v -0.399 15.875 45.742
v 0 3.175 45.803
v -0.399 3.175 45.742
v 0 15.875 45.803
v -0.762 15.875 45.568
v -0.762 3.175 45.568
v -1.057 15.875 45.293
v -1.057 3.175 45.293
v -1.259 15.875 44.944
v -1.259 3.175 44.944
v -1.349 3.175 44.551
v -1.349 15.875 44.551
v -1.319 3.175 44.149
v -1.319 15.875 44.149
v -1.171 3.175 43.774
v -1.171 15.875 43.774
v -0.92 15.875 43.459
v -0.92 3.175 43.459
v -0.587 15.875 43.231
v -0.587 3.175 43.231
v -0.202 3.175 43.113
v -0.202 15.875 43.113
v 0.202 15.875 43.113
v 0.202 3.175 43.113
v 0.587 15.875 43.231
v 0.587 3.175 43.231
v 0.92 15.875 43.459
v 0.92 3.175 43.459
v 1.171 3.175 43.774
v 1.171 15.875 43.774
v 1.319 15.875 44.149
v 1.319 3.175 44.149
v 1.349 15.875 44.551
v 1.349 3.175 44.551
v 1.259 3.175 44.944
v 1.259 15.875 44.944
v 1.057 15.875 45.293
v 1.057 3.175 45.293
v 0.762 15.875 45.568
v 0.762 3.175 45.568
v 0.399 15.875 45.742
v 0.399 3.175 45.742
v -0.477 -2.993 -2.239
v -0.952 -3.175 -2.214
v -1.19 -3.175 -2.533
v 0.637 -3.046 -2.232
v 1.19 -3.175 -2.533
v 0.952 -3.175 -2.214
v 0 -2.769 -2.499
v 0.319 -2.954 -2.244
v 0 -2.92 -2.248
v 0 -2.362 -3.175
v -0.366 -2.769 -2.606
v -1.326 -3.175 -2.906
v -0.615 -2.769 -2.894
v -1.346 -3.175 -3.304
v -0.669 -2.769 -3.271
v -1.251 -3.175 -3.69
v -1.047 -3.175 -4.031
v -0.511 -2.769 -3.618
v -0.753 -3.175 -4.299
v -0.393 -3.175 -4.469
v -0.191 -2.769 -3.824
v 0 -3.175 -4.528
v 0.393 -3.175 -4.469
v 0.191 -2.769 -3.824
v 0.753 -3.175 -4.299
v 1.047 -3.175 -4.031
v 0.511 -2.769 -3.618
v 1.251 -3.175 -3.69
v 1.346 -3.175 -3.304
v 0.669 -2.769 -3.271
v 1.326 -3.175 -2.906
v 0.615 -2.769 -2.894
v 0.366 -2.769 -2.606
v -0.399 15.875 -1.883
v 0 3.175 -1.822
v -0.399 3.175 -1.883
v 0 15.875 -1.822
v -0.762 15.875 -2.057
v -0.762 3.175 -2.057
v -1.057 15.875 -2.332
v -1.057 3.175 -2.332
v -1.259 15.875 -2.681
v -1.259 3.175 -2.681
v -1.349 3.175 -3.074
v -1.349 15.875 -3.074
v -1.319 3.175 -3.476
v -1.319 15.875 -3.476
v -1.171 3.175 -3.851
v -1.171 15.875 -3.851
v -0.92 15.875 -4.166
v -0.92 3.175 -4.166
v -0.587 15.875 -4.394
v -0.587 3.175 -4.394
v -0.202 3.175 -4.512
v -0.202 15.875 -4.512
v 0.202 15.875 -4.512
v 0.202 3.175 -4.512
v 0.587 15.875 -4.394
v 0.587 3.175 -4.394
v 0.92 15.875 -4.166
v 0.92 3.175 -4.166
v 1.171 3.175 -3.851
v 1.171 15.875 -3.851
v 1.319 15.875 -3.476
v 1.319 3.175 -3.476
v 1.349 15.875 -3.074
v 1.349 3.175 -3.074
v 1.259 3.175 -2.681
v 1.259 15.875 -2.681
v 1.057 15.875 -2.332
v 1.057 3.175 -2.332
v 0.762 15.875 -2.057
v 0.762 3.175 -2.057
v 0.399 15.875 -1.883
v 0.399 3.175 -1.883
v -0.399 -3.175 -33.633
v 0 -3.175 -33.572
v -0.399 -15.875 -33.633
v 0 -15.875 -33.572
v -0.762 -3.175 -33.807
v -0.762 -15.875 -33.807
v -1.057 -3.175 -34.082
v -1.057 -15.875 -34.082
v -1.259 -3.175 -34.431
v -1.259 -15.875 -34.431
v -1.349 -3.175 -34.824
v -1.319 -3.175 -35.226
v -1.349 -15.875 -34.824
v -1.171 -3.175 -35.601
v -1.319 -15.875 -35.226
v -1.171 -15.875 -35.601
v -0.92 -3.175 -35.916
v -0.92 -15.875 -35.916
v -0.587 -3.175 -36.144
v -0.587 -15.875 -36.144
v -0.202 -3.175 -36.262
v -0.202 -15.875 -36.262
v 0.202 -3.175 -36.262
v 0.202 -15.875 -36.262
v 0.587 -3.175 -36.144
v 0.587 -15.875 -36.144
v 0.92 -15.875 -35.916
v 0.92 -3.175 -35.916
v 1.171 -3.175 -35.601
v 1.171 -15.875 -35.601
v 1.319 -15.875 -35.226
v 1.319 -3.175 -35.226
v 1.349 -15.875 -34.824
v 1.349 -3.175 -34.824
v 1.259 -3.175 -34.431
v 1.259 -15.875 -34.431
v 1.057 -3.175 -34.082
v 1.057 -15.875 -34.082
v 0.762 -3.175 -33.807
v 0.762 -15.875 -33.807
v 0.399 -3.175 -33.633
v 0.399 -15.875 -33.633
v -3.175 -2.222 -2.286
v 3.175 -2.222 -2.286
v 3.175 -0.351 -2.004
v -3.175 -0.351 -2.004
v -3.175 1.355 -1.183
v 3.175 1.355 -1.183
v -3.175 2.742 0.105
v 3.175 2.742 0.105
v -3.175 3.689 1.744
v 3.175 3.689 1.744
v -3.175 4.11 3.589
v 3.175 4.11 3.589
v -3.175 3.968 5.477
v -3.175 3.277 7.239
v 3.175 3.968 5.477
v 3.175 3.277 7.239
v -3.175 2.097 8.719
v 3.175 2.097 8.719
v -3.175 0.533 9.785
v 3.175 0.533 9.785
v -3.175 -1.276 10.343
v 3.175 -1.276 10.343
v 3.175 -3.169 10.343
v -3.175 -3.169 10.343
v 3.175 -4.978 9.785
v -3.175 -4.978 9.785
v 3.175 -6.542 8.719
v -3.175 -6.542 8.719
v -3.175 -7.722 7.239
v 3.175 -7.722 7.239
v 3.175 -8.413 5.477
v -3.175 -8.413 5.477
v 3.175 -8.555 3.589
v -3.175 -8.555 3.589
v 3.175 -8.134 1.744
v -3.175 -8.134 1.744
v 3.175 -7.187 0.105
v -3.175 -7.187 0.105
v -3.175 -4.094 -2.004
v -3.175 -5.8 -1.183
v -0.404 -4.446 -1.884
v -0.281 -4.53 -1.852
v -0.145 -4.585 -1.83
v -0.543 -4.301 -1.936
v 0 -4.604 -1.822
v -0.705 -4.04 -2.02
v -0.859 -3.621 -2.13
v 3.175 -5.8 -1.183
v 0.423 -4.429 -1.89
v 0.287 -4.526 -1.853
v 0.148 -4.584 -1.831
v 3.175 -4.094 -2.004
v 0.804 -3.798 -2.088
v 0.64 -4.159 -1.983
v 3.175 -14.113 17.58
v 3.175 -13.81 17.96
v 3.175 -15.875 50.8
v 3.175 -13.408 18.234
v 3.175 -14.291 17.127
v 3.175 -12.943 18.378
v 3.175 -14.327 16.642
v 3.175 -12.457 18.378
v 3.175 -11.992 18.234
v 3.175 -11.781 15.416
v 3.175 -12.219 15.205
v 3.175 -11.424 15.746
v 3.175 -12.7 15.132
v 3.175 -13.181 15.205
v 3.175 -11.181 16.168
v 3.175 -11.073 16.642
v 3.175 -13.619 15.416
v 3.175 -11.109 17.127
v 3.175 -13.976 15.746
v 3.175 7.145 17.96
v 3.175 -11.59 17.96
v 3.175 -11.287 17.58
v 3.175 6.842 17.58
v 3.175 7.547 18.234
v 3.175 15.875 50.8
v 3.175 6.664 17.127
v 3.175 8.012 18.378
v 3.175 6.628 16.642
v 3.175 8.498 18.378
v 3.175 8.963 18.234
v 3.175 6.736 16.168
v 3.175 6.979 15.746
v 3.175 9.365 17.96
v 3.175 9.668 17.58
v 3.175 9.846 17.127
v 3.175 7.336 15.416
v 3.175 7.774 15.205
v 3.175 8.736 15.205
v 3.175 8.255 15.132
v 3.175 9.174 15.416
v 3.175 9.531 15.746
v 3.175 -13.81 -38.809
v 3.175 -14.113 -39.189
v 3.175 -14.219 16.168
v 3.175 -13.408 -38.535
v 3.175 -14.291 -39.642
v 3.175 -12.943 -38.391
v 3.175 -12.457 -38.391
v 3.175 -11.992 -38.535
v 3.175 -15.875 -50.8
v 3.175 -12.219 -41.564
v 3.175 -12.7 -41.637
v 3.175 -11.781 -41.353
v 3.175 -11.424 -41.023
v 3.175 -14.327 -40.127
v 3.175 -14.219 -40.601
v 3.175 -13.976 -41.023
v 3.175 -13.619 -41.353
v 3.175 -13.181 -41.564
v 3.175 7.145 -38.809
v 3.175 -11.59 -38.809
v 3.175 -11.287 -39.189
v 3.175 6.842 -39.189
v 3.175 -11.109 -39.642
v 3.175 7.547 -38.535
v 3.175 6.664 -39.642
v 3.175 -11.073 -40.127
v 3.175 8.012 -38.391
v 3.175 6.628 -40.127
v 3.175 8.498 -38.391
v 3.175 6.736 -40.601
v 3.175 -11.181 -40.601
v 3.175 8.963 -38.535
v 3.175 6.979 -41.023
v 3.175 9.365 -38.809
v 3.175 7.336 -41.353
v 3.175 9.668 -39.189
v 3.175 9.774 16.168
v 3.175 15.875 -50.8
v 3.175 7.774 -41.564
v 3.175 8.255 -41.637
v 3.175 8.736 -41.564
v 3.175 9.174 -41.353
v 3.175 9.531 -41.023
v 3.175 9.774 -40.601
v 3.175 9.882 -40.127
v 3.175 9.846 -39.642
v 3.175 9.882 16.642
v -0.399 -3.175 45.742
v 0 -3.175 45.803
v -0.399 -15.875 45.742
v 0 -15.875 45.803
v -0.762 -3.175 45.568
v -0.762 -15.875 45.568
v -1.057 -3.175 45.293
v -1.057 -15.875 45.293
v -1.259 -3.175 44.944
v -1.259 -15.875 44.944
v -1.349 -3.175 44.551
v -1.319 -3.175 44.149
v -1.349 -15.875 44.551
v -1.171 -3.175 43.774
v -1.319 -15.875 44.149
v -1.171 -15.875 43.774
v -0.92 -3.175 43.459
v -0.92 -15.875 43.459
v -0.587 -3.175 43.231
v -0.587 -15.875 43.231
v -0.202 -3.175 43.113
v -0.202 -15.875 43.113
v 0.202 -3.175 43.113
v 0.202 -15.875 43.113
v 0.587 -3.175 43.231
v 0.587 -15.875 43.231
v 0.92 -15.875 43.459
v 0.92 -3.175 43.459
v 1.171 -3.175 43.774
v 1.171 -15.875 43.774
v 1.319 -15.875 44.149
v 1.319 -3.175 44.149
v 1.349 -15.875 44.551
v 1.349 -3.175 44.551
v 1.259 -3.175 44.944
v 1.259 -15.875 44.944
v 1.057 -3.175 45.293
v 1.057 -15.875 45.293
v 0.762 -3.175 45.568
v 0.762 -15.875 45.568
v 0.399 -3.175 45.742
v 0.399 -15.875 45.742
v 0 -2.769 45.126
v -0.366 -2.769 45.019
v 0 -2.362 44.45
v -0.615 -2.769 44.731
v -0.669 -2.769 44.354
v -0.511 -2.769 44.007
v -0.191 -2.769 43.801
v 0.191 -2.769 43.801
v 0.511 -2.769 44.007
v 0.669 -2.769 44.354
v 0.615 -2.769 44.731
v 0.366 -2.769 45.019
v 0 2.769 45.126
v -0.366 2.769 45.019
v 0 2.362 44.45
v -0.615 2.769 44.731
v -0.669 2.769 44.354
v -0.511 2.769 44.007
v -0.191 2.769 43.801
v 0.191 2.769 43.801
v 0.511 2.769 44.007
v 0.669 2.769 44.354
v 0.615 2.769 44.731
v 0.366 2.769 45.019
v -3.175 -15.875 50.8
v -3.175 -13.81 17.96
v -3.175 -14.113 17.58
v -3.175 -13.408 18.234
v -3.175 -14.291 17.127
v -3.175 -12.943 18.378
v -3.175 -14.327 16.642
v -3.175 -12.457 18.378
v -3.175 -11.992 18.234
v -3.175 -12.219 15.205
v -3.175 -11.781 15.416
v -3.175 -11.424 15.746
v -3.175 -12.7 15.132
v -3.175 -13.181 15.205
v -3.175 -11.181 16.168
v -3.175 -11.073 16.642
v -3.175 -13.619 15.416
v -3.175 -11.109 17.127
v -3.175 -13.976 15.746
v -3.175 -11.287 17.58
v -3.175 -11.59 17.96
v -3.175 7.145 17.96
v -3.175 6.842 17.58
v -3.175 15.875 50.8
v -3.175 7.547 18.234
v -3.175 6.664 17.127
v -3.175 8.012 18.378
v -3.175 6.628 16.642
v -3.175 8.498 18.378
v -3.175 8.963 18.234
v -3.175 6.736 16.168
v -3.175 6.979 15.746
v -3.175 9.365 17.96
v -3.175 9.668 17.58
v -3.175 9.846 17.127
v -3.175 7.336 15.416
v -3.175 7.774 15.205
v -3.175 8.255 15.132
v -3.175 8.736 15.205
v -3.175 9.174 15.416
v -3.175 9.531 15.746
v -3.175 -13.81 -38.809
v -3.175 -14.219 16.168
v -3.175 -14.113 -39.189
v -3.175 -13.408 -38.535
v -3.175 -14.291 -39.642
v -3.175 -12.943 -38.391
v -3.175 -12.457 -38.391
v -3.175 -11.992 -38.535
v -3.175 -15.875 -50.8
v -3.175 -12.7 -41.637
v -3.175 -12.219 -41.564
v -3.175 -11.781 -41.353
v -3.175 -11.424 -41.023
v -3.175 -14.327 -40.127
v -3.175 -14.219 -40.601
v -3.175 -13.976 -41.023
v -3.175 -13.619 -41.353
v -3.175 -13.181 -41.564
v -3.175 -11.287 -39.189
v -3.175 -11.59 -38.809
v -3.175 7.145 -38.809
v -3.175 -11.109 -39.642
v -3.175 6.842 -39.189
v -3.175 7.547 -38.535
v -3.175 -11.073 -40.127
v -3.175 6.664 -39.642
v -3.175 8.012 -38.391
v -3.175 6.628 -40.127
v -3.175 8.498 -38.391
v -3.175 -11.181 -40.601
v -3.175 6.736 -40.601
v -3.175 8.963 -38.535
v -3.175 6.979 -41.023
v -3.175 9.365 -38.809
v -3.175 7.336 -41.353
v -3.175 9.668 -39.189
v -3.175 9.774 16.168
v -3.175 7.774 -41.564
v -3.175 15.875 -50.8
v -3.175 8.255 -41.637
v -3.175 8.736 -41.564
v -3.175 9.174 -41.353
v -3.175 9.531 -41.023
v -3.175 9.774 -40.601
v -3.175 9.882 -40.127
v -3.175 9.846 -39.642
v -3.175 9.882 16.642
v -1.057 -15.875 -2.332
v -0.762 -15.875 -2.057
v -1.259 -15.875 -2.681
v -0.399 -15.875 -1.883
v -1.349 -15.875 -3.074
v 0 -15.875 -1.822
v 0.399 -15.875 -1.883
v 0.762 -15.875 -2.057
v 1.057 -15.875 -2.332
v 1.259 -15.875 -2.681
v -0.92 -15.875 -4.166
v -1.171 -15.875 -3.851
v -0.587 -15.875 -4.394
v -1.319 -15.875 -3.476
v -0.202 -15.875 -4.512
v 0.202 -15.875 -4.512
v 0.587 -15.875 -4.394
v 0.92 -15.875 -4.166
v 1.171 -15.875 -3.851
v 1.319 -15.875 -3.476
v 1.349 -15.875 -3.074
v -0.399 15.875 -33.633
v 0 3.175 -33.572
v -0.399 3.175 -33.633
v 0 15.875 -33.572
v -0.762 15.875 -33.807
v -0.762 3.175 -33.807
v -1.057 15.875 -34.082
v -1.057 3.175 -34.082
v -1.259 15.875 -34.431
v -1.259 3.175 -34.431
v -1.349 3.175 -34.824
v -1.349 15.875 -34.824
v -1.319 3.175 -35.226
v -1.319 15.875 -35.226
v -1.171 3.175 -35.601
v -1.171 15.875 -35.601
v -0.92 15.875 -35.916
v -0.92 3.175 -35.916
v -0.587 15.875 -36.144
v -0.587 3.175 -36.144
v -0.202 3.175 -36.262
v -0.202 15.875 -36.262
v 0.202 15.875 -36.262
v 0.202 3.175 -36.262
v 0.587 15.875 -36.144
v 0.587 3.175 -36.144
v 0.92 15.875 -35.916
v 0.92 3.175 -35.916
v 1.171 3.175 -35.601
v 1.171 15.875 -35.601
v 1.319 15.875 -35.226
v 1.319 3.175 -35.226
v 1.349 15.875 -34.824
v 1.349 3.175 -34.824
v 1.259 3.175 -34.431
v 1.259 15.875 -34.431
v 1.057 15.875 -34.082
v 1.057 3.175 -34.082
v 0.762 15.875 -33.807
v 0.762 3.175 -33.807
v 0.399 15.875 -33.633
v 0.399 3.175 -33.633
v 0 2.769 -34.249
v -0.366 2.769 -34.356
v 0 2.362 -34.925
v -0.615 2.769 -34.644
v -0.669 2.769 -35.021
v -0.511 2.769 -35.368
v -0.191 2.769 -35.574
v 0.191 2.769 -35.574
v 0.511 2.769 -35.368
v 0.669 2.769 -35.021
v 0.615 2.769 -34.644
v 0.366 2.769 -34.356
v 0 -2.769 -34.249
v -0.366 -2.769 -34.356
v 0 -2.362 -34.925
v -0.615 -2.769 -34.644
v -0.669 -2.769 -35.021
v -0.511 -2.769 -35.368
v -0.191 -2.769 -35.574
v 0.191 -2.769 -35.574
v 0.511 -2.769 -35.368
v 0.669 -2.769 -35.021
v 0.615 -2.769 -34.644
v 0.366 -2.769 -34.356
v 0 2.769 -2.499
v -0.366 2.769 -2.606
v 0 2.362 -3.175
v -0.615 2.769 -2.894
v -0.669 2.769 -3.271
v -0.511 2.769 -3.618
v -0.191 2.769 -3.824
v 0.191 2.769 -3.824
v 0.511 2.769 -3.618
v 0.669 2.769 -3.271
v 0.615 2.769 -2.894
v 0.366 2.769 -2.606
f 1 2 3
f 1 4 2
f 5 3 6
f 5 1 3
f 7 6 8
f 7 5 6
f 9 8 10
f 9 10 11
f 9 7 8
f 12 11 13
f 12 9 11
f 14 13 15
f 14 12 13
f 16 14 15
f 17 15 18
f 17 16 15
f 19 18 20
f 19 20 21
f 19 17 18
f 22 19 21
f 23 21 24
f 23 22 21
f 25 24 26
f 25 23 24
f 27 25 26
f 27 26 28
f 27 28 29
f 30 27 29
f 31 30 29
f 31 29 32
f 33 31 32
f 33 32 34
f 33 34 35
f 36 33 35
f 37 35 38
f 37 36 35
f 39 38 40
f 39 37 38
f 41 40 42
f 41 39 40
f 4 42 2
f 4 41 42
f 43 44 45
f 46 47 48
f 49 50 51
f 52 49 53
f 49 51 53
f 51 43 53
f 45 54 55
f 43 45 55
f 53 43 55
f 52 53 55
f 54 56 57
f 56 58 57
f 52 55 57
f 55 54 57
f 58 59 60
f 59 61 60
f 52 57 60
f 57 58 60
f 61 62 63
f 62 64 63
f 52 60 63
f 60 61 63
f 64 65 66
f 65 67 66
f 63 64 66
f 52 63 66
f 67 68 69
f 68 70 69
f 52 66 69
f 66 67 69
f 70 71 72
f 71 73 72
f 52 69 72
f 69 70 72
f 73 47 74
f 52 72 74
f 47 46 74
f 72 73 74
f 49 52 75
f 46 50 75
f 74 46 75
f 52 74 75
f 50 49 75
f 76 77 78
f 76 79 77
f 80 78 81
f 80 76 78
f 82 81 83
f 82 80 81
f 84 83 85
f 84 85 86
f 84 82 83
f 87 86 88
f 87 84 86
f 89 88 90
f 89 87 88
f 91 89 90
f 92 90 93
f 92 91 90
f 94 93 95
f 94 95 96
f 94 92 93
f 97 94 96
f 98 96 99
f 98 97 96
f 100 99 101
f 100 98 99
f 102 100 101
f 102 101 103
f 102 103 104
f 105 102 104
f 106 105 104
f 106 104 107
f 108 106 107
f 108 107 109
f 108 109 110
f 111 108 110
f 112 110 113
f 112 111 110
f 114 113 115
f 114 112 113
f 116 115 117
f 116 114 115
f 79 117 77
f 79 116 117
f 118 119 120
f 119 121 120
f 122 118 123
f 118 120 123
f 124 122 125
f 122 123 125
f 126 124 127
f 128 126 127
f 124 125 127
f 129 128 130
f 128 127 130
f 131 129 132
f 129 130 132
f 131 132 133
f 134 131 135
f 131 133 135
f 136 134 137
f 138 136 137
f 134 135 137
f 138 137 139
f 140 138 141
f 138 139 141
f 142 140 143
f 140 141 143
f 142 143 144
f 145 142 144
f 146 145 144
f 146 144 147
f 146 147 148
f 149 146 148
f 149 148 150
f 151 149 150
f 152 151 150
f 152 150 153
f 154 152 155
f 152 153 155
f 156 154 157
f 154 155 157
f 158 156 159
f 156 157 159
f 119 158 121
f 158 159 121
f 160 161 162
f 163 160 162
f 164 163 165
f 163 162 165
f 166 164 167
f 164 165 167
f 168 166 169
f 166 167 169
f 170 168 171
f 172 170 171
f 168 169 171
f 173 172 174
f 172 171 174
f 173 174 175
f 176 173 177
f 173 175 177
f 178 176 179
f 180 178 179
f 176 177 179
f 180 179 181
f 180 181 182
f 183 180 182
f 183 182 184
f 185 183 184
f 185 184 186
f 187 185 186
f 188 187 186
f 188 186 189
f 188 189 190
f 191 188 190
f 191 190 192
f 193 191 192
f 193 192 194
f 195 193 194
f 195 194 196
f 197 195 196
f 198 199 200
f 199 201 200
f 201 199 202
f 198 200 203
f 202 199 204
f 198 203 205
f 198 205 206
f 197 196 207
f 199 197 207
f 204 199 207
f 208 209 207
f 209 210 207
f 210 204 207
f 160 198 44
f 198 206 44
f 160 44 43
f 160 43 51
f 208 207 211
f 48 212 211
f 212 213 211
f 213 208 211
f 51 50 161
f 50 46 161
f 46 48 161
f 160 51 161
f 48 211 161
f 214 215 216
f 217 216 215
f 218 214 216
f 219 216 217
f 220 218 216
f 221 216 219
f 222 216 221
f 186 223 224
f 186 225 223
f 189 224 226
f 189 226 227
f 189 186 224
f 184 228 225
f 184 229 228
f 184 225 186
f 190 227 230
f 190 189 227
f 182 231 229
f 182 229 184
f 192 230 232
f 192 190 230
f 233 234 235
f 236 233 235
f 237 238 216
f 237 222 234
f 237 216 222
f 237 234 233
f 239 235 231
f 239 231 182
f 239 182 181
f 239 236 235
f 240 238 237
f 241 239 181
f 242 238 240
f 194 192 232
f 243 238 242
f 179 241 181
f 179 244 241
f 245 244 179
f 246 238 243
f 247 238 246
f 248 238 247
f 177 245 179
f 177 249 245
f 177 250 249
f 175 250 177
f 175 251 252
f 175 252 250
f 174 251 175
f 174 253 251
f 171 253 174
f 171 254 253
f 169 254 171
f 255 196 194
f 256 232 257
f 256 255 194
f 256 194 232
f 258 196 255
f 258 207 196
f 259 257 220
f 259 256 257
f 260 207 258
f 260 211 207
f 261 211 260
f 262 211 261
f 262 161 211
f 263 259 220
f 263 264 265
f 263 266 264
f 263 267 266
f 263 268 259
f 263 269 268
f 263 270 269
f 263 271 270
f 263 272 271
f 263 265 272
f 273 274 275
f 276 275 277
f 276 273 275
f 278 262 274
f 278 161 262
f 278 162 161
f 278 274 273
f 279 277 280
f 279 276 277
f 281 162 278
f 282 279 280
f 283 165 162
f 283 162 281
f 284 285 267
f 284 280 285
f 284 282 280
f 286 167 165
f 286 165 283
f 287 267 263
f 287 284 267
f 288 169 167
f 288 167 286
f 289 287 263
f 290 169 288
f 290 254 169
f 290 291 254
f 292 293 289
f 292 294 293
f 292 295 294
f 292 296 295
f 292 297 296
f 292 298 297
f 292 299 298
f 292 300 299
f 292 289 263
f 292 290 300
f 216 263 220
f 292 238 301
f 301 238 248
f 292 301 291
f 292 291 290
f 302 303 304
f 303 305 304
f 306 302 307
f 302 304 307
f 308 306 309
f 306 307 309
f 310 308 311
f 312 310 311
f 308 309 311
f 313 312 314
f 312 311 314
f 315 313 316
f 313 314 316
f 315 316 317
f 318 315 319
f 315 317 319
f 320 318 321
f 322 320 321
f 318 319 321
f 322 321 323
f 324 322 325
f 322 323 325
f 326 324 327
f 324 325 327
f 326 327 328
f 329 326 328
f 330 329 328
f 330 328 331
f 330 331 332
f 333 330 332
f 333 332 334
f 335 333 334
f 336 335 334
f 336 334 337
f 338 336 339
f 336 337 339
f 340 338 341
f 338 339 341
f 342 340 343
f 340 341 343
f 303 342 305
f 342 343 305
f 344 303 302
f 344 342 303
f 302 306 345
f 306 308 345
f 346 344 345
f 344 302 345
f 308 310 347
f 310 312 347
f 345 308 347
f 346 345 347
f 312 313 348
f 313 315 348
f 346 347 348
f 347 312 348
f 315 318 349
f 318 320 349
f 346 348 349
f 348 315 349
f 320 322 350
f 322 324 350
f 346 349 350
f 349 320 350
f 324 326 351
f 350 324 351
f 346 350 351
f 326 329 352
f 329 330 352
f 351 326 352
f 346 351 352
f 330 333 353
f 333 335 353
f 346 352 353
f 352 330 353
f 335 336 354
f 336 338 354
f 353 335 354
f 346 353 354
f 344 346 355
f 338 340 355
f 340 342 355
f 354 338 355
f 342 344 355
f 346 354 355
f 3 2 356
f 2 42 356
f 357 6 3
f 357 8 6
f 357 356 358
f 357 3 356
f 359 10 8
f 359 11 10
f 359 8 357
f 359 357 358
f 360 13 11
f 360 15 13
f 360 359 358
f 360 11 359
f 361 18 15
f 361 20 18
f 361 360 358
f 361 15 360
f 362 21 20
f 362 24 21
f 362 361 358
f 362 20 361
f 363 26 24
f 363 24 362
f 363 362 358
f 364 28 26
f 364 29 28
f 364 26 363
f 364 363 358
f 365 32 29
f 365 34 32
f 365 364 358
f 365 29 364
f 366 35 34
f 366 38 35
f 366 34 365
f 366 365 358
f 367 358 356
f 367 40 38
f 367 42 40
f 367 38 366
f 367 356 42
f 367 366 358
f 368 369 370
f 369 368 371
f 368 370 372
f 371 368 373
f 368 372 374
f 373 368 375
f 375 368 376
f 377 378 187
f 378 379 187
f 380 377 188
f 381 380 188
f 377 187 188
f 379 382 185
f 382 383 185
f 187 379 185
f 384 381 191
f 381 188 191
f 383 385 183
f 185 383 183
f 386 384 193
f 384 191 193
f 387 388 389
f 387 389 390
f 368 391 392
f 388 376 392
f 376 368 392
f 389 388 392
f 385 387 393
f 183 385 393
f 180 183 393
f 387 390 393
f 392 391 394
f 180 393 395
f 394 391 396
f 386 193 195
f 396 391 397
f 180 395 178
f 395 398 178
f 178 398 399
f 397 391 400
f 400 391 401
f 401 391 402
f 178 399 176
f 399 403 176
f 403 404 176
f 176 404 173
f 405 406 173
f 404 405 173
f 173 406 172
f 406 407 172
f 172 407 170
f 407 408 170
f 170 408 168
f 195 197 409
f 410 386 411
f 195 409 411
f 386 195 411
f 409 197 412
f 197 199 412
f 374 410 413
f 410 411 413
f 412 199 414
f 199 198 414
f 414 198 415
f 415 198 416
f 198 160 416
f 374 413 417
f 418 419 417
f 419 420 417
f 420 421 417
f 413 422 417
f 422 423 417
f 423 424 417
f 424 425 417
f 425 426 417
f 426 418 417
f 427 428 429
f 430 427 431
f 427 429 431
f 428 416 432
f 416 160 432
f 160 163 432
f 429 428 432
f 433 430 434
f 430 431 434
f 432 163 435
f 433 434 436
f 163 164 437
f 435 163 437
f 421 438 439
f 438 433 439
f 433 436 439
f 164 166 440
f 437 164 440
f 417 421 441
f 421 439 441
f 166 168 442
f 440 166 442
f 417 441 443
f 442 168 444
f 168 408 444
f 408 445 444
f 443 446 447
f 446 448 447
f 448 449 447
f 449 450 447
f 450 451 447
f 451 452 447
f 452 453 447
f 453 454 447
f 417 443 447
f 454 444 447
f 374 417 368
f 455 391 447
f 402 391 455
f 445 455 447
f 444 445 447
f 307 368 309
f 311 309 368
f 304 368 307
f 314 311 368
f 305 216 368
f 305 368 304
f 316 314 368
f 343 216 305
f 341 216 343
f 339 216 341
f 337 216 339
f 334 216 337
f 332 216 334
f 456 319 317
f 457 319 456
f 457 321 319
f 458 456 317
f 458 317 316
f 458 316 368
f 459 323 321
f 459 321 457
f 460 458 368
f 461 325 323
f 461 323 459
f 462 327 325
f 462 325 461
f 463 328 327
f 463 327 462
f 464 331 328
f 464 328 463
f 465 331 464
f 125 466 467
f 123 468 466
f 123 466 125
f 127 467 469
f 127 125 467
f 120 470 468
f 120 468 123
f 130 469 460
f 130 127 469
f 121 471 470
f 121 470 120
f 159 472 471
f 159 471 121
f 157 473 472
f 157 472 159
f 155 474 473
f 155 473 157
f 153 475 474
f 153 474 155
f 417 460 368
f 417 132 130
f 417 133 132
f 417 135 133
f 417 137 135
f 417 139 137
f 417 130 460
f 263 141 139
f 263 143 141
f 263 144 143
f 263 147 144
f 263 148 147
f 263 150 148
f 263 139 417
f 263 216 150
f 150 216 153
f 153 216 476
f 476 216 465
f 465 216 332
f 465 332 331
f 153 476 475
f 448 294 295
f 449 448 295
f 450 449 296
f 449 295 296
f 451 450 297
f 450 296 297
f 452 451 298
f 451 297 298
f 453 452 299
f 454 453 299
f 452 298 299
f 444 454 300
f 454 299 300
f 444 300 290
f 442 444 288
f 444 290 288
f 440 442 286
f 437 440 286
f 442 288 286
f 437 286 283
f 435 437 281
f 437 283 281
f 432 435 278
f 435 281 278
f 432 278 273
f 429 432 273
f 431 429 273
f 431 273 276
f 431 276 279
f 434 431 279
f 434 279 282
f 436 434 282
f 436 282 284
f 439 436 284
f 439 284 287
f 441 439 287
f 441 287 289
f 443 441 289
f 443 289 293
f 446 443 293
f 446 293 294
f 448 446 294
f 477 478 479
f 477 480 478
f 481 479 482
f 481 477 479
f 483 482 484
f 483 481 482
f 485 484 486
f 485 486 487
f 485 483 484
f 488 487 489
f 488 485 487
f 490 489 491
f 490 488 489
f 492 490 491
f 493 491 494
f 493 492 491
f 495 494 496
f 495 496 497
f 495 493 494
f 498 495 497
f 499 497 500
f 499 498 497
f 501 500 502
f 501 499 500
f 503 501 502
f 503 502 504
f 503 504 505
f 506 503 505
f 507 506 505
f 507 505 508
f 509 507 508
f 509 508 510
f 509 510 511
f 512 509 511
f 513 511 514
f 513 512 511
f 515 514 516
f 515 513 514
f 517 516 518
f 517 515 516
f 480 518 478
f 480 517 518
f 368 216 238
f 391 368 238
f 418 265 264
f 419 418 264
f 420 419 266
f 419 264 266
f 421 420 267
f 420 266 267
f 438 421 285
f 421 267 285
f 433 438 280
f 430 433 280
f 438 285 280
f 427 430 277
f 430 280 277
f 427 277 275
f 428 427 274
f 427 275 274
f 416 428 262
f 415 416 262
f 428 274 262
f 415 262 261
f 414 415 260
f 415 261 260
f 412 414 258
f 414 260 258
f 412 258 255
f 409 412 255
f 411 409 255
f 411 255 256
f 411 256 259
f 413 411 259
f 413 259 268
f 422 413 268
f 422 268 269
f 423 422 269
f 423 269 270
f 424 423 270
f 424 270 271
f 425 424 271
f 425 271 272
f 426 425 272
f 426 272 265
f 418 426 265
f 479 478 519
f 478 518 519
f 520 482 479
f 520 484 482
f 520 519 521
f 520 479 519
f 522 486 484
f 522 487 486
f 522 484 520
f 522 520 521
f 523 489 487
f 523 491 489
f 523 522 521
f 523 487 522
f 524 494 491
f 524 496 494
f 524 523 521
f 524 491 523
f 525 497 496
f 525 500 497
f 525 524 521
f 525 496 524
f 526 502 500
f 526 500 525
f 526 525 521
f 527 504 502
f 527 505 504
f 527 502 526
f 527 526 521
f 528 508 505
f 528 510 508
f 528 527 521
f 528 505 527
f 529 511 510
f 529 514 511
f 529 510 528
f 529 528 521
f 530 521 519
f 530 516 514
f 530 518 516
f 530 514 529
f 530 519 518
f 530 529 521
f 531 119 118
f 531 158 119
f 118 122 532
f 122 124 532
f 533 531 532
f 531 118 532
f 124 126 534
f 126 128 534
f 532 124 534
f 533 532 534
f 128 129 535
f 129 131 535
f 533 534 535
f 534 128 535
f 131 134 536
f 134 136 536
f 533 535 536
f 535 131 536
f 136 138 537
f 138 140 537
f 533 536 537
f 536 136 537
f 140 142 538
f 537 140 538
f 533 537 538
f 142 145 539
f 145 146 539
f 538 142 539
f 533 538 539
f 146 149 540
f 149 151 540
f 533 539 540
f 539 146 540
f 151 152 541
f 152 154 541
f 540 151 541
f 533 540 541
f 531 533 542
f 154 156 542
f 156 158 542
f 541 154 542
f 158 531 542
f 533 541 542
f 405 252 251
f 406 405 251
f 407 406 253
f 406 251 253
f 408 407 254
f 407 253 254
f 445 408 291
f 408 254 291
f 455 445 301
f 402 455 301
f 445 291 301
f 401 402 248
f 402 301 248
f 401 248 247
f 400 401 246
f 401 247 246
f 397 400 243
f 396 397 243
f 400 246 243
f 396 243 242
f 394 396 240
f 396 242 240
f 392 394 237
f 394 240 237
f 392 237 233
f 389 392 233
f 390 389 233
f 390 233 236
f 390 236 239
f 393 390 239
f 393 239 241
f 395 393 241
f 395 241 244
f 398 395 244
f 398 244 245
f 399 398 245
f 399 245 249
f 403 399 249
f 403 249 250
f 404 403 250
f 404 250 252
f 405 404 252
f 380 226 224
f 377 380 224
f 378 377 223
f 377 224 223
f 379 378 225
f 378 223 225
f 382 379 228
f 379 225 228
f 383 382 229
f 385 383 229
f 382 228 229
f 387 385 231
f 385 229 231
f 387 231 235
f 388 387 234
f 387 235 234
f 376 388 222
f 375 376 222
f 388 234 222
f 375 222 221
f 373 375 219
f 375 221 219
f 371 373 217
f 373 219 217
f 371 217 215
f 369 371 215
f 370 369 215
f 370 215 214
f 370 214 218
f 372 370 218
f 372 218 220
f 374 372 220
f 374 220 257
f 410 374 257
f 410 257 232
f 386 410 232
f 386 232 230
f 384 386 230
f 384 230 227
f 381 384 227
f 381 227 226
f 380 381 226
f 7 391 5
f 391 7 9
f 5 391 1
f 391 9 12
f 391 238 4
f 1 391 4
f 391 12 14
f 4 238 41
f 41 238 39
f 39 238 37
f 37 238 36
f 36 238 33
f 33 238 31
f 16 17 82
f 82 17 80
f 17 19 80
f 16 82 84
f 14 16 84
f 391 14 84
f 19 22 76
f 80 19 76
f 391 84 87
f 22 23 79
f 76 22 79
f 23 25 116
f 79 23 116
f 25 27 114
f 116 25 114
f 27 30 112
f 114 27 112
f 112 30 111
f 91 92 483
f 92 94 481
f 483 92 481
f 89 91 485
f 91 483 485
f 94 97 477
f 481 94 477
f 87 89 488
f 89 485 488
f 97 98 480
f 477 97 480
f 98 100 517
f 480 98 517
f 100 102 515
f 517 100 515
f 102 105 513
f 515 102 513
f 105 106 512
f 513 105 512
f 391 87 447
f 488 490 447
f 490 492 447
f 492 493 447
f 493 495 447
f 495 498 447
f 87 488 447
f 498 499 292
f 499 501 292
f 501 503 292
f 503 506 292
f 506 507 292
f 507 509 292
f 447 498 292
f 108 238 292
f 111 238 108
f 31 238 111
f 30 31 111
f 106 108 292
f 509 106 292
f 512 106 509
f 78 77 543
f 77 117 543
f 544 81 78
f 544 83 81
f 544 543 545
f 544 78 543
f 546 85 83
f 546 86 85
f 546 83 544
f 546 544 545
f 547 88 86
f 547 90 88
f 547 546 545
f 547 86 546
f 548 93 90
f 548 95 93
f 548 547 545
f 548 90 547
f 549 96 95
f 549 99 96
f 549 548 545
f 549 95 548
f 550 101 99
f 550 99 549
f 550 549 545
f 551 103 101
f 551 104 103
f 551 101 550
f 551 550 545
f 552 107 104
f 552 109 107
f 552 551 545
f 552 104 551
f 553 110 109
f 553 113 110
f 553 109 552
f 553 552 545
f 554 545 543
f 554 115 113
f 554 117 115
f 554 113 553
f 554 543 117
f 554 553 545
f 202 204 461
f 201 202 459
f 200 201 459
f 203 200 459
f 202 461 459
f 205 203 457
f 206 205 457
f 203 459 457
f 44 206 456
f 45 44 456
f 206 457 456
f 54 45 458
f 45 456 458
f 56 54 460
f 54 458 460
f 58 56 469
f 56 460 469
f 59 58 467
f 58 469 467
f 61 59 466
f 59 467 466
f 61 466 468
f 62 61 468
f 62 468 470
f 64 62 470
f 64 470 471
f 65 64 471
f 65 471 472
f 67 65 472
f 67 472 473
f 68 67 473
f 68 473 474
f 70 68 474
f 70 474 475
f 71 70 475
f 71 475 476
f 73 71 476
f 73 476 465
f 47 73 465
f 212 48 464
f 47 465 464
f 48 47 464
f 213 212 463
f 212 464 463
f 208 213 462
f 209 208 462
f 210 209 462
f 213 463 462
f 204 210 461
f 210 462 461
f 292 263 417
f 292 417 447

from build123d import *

# Parameters (mm, degrees)
SKETCH1_W                          = 101.6
SKETCH1_H                          = 31.75
BOSS_EXTRUDE1_DEPTH                = 3.175
CUT_EXTRUDE1_REACH                 = 55.6
SKETCH2_R                          = 1.63195
SKETCH2_R_2                        = 6.35
TAP_DRILL_FOR_6_32_TAP1_AT_2_COUNT = 2
TAP_DRILL_FOR_6_32_TAP1_AT_2_PITCH = 79.375
TAP_DRILL_FOR_6_32_TAP1_AT_3_COUNT = 2
TAP_DRILL_FOR_6_32_TAP1_AT_3_PITCH = 47.625


with BuildPart() as part:
    # Sketch1 → Boss-Extrude1 (new, symmetric)
    with BuildSketch(Plane(origin=(0, 0, 0), x_dir=(0, 0, -1), z_dir=(1, 0, 0))):
        Rectangle(SKETCH1_W, SKETCH1_H)
    extrude(amount=BOSS_EXTRUDE1_DEPTH, both=True)

    # Sketch2 → Cut-Extrude1 (cut, up to next)
    with BuildSketch(Plane(origin=(3.175, 0, 0), x_dir=(0, 0, -1), z_dir=(1, 0, 0)), mode=Mode.PRIVATE) as cut_extrude1_sk1:
        with Locations((-16.764, 8.255)):
            Circle(SKETCH2_R)
    cut_extrude1_tool1 = extrude(cut_extrude1_sk1.sketch, amount=-CUT_EXTRUDE1_REACH, mode=Mode.PRIVATE) & part.part
    # Sketch2 → Cut-Extrude1 (cut, up to next)
    with BuildSketch(Plane(origin=(3.175, 0, 0), x_dir=(0, 0, -1), z_dir=(1, 0, 0)), mode=Mode.PRIVATE) as cut_extrude1_sk2:
        with Locations((-16.764, -12.7)):
            Circle(SKETCH2_R)
    cut_extrude1_tool2 = extrude(cut_extrude1_sk2.sketch, amount=-CUT_EXTRUDE1_REACH, mode=Mode.PRIVATE) & part.part
    # Sketch2 → Cut-Extrude1 (cut, up to next)
    with BuildSketch(Plane(origin=(3.175, 0, 0), x_dir=(0, 0, -1), z_dir=(1, 0, 0)), mode=Mode.PRIVATE) as cut_extrude1_sk3:
        with Locations((40.005, -12.7)):
            Circle(SKETCH2_R)
    cut_extrude1_tool3 = extrude(cut_extrude1_sk3.sketch, amount=-CUT_EXTRUDE1_REACH, mode=Mode.PRIVATE) & part.part
    # Sketch2 → Cut-Extrude1 (cut, up to next)
    with BuildSketch(Plane(origin=(3.175, 0, 0), x_dir=(0, 0, -1), z_dir=(1, 0, 0)), mode=Mode.PRIVATE) as cut_extrude1_sk4:
        with Locations((40.005, 8.255)):
            Circle(SKETCH2_R)
    cut_extrude1_tool4 = extrude(cut_extrude1_sk4.sketch, amount=-CUT_EXTRUDE1_REACH, mode=Mode.PRIVATE) & part.part
    # Sketch2 → Cut-Extrude1 (cut, up to next)
    with BuildSketch(Plane(origin=(3.175, 0, 0), x_dir=(0, 0, -1), z_dir=(1, 0, 0)), mode=Mode.PRIVATE) as cut_extrude1_sk5:
        with Locations((-4.064, -2.2225)):
            Circle(SKETCH2_R_2)
    cut_extrude1_tool5 = extrude(cut_extrude1_sk5.sketch, amount=-CUT_EXTRUDE1_REACH, mode=Mode.PRIVATE) & part.part
    add(cut_extrude1_tool1.solids().sort_by_distance((3.175, 8.255, 16.764))[0], mode=Mode.SUBTRACT)
    add(cut_extrude1_tool2.solids().sort_by_distance((3.175, -12.7, 16.764))[0], mode=Mode.SUBTRACT)
    add(cut_extrude1_tool3.solids().sort_by_distance((3.175, -12.7, -40.005))[0], mode=Mode.SUBTRACT)
    add(cut_extrude1_tool4.solids().sort_by_distance((3.175, 8.255, -40.005))[0], mode=Mode.SUBTRACT)
    add(cut_extrude1_tool5.solids().sort_by_distance((3.175, -2.2225, 4.064))[0], mode=Mode.SUBTRACT)

    # Sketch5 → Tap Drill for #6-32 Tap1 (revolve, cut)
    with BuildSketch(Plane(origin=(0, 15.875, 44.45), x_dir=(0, 0, 1), z_dir=(1, 0, 0))):
        Polygon((0, 0), (0, 13.51269403), (1.35255, 12.7), (1.35255, 0), align=None)
    tap_drill_for_6_32_tap1 = revolve(axis=Axis((0, 22.225, 44.45), (0, -1, 0)), mode=Mode.SUBTRACT)

    # Tap Drill for #6-32 Tap1 at 2: Tap Drill for #6-32 Tap1 ×2
    with Locations(*[(0, 0, -i * TAP_DRILL_FOR_6_32_TAP1_AT_2_PITCH) for i in range(1, TAP_DRILL_FOR_6_32_TAP1_AT_2_COUNT)]):
        add(tap_drill_for_6_32_tap1, mode=Mode.SUBTRACT)

    # Tap Drill for #6-32 Tap1 at 3: Tap Drill for #6-32 Tap1 ×2
    with Locations(*[(0, 0, -i * TAP_DRILL_FOR_6_32_TAP1_AT_3_PITCH) for i in range(1, TAP_DRILL_FOR_6_32_TAP1_AT_3_COUNT)]):
        add(tap_drill_for_6_32_tap1, mode=Mode.SUBTRACT)

    # Mirror1: Tap Drill for #6-32 Tap1 across plane
    add(tap_drill_for_6_32_tap1.mirror(Plane.ZX), mode=Mode.SUBTRACT)

    # Mirror1 copy 1 sketch → Mirror1 copy 1 (revolve, cut)
    with BuildSketch(Plane(origin=(0, -15.875, -34.925), x_dir=(0, 0, 1), z_dir=(1, 0, 0))):
        Polygon((0, 0), (0, -13.51269403), (1.35255, -12.7), (1.35255, 0), align=None)
    revolve(axis=Axis((0, -22.225, -34.925), (0, -1, 0)), mode=Mode.SUBTRACT)

    # Mirror1 copy 2 sketch → Mirror1 copy 2 (revolve, cut)
    with BuildSketch(Plane(origin=(0, -15.875, -3.175), x_dir=(0, 0, 1), z_dir=(1, 0, 0))):
        Polygon((0, 0), (0, -13.51269403), (1.35255, -12.7), (1.35255, 0), align=None)
    revolve(axis=Axis((0, -22.225, -3.175), (0, -1, 0)), mode=Mode.SUBTRACT)


solid = part.part
